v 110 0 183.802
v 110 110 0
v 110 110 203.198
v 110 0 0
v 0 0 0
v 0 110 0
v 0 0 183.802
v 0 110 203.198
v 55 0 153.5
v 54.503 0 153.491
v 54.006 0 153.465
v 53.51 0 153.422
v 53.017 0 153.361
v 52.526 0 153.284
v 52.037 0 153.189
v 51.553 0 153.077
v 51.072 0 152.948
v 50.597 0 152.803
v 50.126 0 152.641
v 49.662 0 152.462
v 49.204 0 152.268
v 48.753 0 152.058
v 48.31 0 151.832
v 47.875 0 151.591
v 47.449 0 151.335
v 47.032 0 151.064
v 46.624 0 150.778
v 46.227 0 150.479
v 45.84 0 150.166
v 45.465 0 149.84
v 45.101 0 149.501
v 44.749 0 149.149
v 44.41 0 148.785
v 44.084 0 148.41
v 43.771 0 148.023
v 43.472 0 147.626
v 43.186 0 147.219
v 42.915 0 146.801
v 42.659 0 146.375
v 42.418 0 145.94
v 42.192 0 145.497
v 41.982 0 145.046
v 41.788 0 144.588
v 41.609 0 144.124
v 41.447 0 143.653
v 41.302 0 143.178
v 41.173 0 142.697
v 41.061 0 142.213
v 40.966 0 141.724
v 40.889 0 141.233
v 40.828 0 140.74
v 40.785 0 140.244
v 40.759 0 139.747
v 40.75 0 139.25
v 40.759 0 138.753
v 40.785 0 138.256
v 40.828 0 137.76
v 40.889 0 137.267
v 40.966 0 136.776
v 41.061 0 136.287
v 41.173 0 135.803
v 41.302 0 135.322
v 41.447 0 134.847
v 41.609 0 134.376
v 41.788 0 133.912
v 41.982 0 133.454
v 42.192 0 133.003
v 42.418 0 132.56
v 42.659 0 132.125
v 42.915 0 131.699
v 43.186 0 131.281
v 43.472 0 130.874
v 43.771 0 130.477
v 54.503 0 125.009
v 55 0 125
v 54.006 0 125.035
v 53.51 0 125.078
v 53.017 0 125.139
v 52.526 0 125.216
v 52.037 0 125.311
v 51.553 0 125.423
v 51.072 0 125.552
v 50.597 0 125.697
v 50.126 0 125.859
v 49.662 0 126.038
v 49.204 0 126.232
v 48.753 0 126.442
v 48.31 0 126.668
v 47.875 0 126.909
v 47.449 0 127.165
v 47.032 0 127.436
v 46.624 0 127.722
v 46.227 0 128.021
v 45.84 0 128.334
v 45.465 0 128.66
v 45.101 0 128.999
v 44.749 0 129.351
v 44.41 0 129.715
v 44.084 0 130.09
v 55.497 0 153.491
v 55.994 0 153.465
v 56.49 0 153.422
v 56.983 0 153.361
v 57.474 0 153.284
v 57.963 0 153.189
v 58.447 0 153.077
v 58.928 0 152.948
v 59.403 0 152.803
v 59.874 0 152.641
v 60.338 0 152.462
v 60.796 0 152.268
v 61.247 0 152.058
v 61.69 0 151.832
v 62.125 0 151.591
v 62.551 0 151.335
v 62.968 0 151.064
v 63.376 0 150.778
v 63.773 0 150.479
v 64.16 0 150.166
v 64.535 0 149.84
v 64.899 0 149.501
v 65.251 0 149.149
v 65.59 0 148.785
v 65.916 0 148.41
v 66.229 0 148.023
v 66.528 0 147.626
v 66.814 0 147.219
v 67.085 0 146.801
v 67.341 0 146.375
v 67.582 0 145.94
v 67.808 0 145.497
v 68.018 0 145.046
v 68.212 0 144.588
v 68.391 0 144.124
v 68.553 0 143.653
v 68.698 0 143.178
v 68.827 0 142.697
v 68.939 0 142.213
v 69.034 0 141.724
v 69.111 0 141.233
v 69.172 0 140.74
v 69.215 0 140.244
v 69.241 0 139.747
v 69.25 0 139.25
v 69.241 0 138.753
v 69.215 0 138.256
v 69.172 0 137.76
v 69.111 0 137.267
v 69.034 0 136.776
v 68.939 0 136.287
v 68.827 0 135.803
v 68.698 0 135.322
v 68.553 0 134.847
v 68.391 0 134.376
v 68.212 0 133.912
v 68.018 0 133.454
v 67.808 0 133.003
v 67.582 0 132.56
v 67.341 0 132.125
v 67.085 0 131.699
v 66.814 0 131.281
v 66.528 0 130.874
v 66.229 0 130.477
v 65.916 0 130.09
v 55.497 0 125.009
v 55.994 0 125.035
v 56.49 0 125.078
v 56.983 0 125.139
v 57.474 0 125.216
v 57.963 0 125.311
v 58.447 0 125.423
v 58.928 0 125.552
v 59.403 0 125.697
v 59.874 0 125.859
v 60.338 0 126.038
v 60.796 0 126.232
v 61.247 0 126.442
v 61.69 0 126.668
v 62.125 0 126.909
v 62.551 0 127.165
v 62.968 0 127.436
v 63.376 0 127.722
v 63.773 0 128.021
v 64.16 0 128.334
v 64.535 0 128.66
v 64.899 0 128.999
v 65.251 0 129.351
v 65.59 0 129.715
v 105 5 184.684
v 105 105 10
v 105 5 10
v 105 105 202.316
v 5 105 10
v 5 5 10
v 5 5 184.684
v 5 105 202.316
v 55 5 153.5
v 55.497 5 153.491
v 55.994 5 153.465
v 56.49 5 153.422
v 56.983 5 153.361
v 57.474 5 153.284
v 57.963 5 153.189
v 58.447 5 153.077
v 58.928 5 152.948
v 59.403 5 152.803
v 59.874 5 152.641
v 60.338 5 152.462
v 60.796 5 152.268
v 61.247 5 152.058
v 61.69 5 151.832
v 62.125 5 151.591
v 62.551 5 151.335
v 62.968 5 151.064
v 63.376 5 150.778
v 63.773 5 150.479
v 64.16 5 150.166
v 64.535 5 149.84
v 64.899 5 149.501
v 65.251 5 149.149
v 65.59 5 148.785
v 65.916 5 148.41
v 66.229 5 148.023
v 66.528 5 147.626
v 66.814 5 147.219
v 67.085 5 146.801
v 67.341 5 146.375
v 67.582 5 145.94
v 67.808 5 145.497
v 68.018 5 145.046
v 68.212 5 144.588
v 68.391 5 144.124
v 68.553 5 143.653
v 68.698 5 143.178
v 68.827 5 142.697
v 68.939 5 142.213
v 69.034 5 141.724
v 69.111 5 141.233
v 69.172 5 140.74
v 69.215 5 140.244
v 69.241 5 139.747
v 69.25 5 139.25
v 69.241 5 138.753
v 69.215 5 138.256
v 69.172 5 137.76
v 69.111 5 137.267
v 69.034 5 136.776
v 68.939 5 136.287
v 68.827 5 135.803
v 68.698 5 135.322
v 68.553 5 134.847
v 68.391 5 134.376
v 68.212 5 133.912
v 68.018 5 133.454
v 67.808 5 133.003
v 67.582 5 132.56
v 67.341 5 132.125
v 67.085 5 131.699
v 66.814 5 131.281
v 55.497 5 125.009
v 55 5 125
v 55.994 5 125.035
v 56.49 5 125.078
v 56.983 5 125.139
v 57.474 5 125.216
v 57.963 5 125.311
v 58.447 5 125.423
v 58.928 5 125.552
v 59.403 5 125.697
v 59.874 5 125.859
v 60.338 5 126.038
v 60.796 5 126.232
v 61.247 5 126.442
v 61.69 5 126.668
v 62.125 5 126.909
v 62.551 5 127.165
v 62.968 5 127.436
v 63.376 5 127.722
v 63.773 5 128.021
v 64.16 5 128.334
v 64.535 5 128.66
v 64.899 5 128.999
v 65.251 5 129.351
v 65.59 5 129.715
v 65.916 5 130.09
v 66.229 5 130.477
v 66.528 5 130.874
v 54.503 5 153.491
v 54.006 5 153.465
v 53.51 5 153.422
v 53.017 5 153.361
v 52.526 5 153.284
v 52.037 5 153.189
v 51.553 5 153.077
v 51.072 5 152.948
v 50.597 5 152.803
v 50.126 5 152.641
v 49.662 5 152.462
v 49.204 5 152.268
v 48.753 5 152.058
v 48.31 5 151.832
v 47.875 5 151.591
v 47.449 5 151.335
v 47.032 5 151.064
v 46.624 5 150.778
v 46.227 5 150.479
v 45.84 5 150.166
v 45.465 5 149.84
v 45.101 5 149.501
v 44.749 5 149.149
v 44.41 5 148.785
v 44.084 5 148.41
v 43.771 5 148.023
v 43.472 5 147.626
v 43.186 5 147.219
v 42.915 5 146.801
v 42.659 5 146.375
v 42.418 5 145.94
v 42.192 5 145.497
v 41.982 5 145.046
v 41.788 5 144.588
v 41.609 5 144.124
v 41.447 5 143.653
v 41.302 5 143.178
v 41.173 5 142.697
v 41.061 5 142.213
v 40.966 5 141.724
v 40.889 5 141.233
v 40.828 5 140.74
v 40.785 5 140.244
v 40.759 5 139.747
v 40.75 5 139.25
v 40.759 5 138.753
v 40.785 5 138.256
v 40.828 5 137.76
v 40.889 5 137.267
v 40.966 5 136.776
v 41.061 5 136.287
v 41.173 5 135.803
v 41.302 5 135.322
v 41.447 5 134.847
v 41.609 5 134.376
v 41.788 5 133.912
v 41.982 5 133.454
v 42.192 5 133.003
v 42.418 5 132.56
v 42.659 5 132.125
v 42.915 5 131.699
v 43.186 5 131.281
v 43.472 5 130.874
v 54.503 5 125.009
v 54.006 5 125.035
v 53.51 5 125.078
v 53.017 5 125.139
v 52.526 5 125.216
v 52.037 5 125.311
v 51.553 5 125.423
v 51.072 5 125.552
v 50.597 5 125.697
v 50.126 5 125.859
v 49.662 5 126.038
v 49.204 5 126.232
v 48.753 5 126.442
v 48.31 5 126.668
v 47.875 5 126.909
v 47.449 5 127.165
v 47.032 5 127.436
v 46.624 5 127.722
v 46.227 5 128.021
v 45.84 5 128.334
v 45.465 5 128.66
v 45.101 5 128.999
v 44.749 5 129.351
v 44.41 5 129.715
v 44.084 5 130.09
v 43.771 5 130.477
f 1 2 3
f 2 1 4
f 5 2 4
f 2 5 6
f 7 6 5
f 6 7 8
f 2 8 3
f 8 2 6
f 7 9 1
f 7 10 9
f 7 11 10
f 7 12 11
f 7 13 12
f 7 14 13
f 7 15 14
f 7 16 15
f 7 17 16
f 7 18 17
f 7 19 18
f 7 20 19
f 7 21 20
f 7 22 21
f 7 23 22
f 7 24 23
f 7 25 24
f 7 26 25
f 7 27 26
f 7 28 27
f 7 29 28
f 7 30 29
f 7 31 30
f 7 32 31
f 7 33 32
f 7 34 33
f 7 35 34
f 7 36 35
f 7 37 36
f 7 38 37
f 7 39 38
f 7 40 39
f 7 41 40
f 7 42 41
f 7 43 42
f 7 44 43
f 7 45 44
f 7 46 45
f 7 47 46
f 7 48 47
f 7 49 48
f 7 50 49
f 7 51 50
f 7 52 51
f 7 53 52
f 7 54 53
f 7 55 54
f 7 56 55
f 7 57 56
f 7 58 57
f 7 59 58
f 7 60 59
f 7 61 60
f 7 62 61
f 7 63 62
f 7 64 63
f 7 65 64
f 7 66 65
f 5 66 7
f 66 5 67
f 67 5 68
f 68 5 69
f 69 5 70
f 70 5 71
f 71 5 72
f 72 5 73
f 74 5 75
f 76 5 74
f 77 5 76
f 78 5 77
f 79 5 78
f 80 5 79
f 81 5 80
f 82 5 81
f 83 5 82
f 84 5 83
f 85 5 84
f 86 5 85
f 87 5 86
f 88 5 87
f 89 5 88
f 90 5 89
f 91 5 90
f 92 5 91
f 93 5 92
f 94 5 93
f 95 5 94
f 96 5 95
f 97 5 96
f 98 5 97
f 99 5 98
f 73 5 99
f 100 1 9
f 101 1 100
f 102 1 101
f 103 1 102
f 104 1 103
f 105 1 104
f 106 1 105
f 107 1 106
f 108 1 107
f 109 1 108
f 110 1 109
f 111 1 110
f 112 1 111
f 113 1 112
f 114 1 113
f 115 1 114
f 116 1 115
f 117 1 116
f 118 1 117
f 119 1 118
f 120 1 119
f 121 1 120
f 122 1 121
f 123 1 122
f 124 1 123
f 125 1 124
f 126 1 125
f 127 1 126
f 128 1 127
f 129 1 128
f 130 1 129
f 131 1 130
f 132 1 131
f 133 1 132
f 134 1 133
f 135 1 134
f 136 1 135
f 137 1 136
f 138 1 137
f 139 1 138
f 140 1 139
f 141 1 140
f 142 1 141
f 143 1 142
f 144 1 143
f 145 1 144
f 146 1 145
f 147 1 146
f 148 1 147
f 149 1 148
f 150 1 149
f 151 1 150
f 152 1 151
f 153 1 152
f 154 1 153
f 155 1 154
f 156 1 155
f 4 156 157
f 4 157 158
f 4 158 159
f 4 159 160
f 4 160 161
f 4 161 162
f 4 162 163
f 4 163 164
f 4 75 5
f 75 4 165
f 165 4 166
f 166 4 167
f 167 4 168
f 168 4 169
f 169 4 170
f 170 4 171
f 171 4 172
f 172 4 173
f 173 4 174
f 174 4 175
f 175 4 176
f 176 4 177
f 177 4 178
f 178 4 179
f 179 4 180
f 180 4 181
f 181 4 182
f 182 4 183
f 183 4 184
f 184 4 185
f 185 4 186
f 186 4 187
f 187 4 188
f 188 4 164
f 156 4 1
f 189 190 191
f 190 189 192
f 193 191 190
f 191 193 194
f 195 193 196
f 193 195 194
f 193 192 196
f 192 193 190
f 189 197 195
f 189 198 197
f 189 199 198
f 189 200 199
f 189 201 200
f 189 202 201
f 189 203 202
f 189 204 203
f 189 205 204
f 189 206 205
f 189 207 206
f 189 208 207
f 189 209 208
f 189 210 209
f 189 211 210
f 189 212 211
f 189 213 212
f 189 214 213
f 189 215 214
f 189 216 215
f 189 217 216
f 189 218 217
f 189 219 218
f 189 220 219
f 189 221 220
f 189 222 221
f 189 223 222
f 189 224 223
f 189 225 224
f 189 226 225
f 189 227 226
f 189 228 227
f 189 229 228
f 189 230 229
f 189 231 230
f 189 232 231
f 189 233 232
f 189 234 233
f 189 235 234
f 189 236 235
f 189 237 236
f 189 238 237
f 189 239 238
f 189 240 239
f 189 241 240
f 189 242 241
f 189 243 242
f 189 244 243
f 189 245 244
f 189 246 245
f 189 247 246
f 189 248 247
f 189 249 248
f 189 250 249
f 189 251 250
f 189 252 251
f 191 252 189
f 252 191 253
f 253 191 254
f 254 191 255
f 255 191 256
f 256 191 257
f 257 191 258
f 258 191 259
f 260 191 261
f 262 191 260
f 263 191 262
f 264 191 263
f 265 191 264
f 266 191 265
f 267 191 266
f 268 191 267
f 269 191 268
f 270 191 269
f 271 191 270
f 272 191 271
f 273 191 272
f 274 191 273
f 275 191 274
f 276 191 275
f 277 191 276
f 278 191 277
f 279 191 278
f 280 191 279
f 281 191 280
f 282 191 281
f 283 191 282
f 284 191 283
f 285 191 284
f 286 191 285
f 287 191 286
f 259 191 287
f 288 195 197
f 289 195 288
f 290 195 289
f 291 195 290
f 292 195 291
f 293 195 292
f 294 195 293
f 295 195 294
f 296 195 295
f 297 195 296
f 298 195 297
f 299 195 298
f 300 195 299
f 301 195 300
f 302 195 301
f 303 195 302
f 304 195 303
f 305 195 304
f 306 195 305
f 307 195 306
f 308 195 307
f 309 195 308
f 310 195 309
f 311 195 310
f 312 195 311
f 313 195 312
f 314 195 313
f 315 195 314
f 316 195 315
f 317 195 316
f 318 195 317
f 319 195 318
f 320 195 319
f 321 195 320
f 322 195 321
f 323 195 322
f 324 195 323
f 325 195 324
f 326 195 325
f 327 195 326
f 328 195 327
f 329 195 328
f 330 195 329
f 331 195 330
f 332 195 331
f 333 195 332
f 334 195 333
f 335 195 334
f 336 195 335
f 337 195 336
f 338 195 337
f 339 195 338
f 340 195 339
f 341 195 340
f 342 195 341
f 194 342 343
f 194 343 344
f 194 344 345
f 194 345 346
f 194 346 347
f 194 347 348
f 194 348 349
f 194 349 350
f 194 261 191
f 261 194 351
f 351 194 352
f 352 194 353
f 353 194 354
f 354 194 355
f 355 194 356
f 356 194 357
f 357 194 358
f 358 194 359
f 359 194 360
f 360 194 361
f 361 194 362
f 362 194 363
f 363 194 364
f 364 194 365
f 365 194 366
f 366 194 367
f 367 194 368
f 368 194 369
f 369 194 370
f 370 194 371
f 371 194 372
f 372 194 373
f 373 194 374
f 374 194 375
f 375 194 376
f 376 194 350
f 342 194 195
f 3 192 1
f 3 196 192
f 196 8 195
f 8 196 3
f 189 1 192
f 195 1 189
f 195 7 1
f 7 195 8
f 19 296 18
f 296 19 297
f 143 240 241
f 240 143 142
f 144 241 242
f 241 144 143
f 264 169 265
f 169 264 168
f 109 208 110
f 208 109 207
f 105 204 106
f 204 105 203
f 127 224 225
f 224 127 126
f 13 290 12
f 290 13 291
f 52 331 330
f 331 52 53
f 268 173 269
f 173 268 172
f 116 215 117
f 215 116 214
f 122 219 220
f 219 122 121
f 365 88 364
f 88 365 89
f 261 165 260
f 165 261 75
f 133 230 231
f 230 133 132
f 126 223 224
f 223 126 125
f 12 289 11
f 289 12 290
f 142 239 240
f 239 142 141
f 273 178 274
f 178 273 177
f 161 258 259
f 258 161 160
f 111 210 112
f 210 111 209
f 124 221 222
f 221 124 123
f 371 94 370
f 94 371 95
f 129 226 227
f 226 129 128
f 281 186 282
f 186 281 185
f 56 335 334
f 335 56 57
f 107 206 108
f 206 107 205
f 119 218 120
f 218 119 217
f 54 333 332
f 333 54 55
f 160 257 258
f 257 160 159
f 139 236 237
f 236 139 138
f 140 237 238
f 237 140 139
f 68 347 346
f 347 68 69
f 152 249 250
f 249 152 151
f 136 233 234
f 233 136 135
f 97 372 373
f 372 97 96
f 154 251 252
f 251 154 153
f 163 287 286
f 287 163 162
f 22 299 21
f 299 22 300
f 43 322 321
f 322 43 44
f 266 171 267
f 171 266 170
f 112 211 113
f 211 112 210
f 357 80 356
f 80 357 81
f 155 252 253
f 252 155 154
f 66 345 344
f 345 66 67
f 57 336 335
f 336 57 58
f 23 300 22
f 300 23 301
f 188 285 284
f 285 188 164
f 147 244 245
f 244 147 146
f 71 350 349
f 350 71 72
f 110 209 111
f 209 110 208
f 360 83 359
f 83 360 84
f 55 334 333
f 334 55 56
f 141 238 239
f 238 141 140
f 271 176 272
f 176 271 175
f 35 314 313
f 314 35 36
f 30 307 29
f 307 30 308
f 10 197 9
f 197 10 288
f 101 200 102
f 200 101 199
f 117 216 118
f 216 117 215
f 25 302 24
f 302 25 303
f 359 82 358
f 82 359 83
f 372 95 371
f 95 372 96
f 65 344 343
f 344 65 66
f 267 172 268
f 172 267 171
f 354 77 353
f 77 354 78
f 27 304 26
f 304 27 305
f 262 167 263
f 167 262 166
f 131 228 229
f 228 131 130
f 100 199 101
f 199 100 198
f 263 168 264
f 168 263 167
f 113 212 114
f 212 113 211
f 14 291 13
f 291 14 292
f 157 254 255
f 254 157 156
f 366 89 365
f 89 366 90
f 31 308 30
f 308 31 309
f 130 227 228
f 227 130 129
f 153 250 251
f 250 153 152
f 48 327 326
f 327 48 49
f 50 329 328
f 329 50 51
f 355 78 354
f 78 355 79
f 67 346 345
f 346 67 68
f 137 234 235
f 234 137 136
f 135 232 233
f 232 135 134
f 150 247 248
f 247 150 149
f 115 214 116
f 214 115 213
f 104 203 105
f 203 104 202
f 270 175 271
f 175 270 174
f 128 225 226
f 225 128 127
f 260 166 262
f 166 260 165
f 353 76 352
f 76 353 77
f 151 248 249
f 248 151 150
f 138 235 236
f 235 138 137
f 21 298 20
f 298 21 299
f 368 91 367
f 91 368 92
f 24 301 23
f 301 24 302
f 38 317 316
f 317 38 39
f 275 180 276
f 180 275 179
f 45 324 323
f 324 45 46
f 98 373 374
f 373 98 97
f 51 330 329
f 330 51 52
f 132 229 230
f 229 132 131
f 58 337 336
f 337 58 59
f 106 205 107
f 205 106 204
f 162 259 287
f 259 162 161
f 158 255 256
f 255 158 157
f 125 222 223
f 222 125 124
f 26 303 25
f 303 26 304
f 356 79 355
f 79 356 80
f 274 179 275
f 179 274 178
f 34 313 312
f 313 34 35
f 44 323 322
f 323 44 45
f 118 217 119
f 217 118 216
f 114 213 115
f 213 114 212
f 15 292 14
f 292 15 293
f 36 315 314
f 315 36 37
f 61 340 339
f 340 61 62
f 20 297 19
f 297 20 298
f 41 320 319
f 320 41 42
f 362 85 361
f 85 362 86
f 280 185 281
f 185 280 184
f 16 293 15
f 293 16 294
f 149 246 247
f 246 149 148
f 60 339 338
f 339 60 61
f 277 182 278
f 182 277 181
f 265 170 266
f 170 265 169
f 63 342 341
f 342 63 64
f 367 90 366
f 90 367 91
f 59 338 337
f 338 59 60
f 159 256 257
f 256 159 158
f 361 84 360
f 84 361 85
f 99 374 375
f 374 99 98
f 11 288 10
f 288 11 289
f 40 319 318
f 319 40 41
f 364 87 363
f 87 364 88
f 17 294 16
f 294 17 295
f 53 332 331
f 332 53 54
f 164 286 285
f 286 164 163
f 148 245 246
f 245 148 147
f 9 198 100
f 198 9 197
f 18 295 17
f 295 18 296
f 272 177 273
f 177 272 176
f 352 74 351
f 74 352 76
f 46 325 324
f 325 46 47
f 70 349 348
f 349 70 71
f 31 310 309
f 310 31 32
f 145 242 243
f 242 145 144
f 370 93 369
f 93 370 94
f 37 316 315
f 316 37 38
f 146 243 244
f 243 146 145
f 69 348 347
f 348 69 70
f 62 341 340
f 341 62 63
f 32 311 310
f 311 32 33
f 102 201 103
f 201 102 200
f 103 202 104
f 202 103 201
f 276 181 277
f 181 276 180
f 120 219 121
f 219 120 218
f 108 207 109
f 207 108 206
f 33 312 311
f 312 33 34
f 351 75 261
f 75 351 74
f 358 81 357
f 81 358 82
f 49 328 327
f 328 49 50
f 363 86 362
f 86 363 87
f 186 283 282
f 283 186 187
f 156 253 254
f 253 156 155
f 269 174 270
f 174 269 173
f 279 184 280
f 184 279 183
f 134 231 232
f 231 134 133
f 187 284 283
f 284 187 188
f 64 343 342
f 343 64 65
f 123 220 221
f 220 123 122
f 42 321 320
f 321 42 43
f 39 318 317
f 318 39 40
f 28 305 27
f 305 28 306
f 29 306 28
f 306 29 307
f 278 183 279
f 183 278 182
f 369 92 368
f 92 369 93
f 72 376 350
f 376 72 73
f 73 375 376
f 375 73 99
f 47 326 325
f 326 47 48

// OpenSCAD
$fs=0.5;
$fa=0.5;

wall_thickness = 5;
floor_thickness = 10;
roof_thickness = 10; 

extra = 10;

distance_to_first_drain_hole = 2;
drain_hole_spacing = 20;
drain_hole_size = 2;

inside_width = 100; // find right value for this
inside_depth = 100; // find right value for this

hole_diameter = 28.5; // for chickadee
hole_height_above_floor = 125; // for cats
hole_to_roof = 20;
roof_slope_angle = 10;

outside_width = inside_width + 2 * wall_thickness;
outside_depth = inside_depth + 2 * wall_thickness;
front_outside_height = floor_thickness + hole_height_above_floor + hole_diameter + hole_to_roof + roof_thickness;
back_outside_height = front_outside_height + tan(roof_slope_angle) * outside_depth;
hole_position_from_bottom = hole_height_above_floor + floor_thickness + hole_diameter/2;

echo("back_outside_height=", back_outside_height);

difference() {
    cube([outside_width, outside_depth, back_outside_height]);
    // Cut out inside
    translate([wall_thickness, wall_thickness, floor_thickness]) cube([inside_width, inside_depth,     back_outside_height + extra]);
    // Cut off top at angle
    translate([-extra, -outside_depth/2, back_outside_height])
    translate([0,2*outside_depth,0]) rotate([roof_slope_angle,0,0]) translate([0,-2*outside_depth,0]) cube([outside_width + 2*extra, 2*outside_depth, 100]);
    // Add entrance hole
    #translate([outside_width/2, extra+wall_thickness/2, hole_height_above_floor+hole_diameter/2]) rotate([90,0,0]) cylinder(r=hole_diameter/2, h=wall_thickness+2*extra);
};
